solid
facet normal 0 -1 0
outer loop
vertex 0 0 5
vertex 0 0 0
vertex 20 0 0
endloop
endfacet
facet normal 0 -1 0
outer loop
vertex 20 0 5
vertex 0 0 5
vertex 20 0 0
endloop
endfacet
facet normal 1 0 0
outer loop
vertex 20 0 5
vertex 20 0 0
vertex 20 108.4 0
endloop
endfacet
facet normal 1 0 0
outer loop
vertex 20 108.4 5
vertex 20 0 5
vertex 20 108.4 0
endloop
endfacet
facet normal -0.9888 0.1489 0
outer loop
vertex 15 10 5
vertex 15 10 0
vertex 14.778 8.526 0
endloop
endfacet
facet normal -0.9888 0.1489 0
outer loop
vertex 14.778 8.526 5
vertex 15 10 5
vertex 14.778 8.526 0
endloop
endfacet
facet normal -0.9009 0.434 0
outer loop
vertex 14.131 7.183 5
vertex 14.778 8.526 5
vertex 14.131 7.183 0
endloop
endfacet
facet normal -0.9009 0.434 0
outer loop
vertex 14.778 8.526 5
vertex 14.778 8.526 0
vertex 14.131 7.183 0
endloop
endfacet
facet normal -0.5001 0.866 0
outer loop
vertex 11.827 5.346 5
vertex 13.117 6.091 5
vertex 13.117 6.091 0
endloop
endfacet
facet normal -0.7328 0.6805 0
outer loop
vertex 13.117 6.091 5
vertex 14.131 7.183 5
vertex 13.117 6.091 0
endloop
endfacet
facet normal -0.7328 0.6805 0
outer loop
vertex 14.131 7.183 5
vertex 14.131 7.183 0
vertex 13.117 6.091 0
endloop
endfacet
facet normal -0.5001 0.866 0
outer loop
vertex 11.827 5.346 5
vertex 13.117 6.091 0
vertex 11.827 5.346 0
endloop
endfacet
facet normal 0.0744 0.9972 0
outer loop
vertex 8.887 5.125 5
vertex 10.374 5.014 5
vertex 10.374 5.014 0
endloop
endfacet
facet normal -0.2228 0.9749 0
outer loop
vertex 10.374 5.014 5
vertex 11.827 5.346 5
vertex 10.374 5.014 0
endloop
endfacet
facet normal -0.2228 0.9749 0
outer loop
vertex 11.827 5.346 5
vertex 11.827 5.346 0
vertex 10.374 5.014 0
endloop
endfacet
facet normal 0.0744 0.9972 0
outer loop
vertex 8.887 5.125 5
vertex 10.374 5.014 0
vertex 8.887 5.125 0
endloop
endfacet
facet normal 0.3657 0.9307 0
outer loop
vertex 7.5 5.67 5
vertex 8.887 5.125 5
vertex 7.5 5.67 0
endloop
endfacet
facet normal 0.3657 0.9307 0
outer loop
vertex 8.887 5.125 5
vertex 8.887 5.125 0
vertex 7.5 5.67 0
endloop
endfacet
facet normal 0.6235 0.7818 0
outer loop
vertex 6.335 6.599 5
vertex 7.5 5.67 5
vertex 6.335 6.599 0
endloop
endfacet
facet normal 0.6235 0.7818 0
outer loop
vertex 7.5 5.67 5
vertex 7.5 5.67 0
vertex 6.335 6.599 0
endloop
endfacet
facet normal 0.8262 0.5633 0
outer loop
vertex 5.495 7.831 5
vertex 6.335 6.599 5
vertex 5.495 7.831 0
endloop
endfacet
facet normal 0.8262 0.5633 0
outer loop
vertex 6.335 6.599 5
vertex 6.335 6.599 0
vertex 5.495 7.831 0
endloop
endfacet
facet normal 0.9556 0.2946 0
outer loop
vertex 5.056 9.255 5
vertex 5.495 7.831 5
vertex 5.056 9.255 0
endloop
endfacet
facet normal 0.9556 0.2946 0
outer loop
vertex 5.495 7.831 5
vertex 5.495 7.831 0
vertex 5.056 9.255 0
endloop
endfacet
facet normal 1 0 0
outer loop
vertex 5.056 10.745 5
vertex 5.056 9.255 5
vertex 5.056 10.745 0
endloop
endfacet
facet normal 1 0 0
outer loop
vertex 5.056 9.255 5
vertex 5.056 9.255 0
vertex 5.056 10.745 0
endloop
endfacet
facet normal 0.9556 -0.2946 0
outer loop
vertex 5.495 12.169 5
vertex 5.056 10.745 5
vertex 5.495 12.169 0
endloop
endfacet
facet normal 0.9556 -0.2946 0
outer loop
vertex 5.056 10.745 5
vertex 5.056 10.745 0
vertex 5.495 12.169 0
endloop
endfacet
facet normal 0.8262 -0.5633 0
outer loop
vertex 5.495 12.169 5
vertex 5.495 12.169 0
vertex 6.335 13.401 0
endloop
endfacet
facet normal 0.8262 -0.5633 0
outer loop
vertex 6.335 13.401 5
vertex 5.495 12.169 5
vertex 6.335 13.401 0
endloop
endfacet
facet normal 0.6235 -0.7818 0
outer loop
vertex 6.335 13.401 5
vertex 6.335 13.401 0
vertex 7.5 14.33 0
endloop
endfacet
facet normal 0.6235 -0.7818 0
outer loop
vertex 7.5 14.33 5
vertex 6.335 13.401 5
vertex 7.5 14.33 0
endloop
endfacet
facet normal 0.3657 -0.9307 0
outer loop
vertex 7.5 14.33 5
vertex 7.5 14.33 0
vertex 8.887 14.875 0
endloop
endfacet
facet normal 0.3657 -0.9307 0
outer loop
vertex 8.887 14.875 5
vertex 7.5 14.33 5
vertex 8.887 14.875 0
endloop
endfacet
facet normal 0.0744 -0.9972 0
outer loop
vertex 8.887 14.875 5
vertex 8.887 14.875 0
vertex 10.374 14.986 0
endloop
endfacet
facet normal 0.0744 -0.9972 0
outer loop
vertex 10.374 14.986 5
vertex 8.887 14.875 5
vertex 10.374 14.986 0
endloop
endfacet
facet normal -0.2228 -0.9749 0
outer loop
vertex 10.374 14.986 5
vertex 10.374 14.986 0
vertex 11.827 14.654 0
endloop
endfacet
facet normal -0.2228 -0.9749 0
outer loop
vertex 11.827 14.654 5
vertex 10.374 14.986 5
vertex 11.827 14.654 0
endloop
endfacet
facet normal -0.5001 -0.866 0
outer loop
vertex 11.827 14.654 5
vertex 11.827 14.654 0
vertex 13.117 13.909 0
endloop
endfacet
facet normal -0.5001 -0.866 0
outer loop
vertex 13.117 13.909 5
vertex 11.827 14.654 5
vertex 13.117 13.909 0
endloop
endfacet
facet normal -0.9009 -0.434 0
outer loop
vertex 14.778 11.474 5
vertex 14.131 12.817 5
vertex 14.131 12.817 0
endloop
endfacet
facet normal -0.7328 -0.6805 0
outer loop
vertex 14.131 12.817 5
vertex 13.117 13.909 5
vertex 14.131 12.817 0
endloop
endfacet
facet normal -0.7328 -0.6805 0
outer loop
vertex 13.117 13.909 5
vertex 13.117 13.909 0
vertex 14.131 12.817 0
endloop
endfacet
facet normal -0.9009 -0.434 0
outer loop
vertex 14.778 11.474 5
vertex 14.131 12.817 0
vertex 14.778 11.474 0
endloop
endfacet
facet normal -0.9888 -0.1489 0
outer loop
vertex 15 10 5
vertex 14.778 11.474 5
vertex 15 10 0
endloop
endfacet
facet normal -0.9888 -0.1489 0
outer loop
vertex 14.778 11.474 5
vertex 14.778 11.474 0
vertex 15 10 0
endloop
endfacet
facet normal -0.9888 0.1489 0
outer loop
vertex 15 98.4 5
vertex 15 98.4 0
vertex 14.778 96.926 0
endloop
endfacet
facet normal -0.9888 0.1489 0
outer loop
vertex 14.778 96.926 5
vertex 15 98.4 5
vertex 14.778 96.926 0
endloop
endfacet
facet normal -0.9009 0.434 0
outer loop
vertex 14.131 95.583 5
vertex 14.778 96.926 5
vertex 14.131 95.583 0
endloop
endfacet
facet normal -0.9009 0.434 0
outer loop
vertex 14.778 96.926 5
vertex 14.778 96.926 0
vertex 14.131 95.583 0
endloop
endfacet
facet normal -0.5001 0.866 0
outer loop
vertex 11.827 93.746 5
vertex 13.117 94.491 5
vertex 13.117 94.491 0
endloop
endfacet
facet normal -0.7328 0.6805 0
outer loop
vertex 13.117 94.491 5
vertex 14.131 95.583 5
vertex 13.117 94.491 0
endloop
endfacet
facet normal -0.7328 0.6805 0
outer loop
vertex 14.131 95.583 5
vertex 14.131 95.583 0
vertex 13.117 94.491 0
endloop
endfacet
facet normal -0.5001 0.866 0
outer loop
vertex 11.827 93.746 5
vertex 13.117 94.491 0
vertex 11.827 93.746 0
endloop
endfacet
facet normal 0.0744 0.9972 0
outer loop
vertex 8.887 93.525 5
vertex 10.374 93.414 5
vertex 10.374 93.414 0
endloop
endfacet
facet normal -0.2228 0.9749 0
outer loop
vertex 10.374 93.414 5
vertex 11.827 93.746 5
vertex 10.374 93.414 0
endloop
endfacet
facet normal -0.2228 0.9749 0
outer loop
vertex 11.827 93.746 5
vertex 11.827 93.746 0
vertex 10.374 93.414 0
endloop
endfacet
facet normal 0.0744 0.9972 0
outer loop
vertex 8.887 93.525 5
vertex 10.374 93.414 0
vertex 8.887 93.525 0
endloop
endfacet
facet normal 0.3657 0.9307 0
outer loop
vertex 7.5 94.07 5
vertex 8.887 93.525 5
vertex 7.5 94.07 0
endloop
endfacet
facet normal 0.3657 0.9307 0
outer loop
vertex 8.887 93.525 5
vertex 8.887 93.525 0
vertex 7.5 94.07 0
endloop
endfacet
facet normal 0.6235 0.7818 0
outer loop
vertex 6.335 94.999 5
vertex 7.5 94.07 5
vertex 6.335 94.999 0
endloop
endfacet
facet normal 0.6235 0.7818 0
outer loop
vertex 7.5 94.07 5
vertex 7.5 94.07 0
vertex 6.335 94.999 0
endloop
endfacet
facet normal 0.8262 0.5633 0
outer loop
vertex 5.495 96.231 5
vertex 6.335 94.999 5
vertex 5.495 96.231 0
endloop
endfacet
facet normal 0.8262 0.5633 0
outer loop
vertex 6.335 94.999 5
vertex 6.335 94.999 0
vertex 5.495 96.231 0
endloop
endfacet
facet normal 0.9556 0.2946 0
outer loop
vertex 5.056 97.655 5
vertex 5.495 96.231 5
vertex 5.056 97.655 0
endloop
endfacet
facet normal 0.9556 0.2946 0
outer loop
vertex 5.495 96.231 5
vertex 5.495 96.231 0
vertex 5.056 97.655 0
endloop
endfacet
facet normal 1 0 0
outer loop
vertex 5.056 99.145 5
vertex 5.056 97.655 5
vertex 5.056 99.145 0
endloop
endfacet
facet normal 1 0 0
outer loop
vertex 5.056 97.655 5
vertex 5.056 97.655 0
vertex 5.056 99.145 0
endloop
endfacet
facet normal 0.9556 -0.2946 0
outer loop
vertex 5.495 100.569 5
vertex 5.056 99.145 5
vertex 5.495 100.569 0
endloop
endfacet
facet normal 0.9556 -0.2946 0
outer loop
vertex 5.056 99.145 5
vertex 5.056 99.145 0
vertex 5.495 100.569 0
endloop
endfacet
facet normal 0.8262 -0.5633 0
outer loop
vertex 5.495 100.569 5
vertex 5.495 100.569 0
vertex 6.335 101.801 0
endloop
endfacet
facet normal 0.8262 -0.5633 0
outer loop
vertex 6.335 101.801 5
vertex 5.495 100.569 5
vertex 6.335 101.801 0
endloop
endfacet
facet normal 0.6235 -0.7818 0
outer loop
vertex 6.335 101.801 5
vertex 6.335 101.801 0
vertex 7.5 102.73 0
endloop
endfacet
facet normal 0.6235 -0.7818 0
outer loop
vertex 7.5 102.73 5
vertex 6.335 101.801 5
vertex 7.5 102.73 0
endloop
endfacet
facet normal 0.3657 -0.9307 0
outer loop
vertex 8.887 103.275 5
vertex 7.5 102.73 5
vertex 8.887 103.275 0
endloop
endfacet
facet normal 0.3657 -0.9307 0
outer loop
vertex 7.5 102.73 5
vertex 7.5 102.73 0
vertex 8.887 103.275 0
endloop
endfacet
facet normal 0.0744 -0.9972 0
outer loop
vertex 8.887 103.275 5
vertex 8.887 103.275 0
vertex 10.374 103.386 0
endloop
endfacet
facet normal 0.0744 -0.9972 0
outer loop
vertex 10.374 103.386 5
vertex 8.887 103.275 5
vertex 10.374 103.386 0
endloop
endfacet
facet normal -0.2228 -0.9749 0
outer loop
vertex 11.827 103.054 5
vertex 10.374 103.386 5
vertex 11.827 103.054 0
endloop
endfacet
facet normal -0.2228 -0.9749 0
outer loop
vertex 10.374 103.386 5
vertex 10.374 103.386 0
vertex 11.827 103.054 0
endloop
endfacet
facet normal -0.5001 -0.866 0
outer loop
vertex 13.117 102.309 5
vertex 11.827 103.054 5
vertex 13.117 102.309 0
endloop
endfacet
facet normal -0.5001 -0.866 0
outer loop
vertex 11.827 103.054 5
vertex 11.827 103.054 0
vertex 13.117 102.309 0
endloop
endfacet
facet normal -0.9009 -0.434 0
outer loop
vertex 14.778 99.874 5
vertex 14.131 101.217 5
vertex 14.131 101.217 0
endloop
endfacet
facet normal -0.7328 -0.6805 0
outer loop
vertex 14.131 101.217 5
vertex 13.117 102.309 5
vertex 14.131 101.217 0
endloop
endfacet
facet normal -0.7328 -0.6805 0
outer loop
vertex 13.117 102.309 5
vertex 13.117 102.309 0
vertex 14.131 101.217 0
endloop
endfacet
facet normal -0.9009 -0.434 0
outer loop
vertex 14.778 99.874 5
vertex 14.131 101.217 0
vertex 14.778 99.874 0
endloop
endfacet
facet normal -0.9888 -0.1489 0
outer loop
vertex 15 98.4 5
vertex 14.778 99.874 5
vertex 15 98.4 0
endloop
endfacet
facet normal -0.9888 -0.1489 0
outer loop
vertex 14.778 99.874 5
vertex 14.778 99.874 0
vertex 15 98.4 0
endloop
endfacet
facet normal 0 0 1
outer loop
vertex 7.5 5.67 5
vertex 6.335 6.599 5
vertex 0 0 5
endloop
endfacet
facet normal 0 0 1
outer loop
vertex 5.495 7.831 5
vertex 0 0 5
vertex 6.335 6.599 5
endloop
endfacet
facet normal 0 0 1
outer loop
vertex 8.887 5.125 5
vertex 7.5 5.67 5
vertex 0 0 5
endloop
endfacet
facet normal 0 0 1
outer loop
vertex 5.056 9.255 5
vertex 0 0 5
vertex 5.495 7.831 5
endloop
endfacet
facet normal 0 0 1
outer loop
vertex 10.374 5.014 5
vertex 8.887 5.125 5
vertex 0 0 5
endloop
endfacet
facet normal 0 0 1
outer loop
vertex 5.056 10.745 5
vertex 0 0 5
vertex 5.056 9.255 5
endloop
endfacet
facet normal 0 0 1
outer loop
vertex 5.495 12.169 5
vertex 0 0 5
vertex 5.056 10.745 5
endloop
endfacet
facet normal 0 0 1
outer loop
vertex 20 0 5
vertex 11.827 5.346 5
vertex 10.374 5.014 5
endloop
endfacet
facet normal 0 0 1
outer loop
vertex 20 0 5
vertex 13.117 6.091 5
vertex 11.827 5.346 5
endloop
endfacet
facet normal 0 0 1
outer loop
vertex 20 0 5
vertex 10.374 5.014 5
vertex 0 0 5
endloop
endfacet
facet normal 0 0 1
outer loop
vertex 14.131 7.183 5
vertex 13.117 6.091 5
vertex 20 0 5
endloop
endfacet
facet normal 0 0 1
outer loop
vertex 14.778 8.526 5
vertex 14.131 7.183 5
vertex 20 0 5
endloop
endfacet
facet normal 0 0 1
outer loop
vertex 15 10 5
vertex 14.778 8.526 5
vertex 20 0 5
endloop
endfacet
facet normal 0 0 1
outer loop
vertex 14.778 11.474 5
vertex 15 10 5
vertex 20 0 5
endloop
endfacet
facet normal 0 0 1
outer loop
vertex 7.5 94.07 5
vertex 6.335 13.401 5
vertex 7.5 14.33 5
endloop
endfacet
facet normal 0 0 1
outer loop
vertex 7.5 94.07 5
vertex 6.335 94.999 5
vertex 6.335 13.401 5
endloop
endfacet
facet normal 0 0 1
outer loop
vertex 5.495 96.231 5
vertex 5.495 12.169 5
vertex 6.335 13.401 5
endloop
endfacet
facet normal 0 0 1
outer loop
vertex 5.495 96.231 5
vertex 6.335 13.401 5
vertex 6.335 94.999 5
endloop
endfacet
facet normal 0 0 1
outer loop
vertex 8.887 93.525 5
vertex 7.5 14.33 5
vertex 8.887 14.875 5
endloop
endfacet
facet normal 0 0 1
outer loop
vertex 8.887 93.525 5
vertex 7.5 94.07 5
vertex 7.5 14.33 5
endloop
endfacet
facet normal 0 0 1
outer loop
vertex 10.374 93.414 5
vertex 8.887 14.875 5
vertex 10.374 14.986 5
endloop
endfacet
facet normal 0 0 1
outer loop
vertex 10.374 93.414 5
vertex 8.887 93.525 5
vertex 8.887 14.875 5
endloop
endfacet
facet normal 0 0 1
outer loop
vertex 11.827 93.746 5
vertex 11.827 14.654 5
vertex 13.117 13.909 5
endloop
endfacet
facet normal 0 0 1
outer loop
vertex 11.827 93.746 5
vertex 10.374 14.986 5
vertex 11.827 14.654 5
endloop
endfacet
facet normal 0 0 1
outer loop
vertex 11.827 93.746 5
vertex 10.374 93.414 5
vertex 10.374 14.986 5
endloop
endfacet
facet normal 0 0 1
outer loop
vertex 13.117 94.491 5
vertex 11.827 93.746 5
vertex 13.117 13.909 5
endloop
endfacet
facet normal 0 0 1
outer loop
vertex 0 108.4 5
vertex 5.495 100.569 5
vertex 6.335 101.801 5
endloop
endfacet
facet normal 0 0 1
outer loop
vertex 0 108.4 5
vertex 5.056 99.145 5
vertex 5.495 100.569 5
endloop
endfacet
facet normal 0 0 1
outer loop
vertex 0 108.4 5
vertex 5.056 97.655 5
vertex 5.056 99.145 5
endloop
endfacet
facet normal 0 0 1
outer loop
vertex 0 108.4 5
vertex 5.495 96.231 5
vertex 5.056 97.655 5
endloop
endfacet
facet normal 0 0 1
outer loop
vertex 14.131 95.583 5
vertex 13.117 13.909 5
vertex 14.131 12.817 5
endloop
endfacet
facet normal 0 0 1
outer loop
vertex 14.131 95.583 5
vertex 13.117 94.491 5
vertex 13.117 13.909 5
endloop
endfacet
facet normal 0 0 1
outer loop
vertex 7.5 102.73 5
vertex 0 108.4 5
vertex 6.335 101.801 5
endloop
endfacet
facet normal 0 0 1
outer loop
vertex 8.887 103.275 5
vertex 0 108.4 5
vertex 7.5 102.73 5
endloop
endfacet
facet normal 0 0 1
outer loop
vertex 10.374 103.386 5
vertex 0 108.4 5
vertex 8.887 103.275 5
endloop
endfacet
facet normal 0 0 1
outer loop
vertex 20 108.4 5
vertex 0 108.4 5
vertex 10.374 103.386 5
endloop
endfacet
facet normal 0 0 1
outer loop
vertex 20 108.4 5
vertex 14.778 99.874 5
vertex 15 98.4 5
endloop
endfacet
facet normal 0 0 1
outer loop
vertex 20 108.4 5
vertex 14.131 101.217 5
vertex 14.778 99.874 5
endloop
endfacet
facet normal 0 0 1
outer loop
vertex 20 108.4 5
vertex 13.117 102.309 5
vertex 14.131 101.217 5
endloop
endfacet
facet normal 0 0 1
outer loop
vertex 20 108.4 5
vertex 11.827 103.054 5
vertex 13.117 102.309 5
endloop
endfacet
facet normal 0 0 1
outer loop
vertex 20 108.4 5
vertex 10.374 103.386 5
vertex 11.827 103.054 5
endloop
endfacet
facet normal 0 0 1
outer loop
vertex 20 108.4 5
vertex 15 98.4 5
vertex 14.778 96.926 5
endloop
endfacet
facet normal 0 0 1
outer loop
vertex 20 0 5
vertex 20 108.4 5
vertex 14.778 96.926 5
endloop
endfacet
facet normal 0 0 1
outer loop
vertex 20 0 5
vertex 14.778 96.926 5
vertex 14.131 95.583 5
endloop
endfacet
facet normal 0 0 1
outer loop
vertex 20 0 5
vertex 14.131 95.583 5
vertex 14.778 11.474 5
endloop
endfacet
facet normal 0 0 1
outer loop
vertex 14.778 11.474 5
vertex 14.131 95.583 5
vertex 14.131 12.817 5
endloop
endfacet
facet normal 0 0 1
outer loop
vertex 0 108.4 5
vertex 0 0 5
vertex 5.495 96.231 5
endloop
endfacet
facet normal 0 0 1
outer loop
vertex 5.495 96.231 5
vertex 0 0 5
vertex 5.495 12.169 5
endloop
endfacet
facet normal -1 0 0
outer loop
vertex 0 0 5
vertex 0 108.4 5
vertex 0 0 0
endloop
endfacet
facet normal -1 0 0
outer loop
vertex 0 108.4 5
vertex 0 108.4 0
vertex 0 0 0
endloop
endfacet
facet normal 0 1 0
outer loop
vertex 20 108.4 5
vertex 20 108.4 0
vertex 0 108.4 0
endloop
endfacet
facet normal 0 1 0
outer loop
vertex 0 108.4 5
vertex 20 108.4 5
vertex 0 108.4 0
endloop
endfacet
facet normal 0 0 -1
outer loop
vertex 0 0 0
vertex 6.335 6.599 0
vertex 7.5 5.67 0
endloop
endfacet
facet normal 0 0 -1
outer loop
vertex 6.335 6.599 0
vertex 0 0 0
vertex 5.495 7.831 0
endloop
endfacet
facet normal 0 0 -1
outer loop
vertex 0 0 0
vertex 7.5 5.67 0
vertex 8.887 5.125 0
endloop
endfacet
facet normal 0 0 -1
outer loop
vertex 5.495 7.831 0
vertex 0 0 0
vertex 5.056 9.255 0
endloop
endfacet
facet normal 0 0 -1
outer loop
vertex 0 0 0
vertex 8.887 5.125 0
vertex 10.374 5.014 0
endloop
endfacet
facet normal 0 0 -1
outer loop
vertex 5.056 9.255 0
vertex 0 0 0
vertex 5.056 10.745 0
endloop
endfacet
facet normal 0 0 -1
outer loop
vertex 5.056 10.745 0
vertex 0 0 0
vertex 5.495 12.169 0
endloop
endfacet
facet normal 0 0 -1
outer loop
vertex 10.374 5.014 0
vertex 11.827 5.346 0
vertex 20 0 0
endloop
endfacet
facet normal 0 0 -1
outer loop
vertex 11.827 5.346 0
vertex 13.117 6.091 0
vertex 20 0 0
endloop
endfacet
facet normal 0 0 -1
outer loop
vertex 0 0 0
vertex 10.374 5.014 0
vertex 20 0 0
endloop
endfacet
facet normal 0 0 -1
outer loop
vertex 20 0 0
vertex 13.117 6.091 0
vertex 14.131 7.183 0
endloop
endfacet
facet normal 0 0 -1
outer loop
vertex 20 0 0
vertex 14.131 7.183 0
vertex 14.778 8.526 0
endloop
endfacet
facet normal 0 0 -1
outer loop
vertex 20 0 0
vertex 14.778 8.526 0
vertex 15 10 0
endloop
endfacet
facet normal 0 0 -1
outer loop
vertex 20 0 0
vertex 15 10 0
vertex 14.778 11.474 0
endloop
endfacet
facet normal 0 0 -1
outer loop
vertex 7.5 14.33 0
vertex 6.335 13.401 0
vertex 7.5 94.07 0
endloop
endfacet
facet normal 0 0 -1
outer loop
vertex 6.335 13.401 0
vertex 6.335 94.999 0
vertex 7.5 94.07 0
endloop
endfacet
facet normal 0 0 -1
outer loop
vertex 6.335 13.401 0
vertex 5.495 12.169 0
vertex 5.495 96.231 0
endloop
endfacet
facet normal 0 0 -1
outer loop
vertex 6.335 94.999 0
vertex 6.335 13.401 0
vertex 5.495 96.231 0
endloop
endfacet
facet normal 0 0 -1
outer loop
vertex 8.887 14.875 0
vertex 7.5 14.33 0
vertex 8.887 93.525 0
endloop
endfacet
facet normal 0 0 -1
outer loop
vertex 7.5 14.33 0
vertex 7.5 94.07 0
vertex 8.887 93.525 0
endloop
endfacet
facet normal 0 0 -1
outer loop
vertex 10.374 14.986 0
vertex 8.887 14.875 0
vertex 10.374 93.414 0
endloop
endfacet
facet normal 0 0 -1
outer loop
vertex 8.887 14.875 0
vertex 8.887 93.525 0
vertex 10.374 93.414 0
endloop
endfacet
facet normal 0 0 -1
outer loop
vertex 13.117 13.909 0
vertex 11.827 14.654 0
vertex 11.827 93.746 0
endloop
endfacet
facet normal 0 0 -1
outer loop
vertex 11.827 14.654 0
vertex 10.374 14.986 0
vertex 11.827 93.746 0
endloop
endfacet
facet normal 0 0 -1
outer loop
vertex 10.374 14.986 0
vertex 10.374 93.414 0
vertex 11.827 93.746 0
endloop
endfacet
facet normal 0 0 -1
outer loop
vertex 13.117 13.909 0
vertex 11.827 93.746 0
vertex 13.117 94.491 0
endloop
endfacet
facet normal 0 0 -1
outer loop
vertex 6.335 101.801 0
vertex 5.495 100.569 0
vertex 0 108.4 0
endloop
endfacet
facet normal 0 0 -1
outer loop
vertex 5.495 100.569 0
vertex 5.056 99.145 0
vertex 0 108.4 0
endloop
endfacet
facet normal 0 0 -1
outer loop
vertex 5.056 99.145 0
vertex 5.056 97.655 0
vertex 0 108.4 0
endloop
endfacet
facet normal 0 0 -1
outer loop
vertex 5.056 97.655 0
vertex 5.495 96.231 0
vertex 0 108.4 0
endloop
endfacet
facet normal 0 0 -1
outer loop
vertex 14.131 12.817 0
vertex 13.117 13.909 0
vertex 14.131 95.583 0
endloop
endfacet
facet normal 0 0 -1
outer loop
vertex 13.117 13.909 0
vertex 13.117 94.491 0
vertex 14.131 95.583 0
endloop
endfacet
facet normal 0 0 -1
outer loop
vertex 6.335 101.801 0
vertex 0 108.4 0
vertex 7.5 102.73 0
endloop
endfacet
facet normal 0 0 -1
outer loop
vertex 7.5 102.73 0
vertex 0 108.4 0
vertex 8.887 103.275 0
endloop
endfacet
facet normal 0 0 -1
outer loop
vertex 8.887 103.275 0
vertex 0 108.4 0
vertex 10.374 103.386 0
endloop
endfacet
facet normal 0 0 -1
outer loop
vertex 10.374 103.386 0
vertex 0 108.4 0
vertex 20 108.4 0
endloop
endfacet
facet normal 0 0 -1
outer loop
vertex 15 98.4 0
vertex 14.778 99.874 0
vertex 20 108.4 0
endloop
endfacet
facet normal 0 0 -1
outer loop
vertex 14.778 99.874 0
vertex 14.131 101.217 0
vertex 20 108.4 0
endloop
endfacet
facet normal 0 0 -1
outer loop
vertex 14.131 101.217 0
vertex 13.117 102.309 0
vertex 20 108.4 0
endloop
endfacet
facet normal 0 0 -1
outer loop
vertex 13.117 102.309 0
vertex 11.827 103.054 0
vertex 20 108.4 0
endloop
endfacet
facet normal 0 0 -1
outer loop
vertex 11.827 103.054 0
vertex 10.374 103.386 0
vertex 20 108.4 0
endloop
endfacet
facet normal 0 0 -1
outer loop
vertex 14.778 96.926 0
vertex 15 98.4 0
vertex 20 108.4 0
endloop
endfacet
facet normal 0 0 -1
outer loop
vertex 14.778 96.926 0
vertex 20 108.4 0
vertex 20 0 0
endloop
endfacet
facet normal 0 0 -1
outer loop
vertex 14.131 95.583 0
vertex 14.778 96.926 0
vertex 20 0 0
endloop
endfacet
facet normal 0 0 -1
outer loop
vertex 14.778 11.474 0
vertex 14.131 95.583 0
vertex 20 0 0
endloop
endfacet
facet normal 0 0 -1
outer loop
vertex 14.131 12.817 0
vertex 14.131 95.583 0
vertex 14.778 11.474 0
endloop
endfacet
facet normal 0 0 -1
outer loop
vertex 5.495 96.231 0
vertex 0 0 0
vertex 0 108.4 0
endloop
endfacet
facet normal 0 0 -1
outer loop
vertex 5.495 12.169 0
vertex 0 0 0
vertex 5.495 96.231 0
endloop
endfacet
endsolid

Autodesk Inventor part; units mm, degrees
ref_plane "YZ Plane" through (0, 0, 0) normal (1, 0, 0) x (0, 1, 0)
ref_plane "XZ Plane" through (0, 0, 0) normal (0, 1, 0) x (-1, 0, 0)
ref_plane "XY Plane" through (0, 0, 0) normal (0, 0, 1) x (1, 0, 0)
sketch "スケッチ1" plane through (0, 0, 0) normal (0, 0, 1) x (1, 0, 0)
  line L0 (0, 0) -> (20, 0)
  line L1 (20, 0) -> (20, 108.4)
  line L2 (20, 108.4) -> (0, 108.4)
  line L3 (0, 108.4) -> (0, 0)
  circle A0 centre (10, 98.4) radius 5
  circle A1 centre (10, 10) radius 5
  dimension "d0" = 20
  dimension "d1" = 108.4
  dimension "d2" = 10
  dimension "d3" = 10
  dimension "d4" = 10
  dimension "d5" = 10
  dimension "d6" = 10
  dimension "d7" = 10
extrude "押し出し1" add sketch "スケッチ1" along normal blind 5
properties part number "rocker_bogie_plate" material "アルミニウム 6061"
